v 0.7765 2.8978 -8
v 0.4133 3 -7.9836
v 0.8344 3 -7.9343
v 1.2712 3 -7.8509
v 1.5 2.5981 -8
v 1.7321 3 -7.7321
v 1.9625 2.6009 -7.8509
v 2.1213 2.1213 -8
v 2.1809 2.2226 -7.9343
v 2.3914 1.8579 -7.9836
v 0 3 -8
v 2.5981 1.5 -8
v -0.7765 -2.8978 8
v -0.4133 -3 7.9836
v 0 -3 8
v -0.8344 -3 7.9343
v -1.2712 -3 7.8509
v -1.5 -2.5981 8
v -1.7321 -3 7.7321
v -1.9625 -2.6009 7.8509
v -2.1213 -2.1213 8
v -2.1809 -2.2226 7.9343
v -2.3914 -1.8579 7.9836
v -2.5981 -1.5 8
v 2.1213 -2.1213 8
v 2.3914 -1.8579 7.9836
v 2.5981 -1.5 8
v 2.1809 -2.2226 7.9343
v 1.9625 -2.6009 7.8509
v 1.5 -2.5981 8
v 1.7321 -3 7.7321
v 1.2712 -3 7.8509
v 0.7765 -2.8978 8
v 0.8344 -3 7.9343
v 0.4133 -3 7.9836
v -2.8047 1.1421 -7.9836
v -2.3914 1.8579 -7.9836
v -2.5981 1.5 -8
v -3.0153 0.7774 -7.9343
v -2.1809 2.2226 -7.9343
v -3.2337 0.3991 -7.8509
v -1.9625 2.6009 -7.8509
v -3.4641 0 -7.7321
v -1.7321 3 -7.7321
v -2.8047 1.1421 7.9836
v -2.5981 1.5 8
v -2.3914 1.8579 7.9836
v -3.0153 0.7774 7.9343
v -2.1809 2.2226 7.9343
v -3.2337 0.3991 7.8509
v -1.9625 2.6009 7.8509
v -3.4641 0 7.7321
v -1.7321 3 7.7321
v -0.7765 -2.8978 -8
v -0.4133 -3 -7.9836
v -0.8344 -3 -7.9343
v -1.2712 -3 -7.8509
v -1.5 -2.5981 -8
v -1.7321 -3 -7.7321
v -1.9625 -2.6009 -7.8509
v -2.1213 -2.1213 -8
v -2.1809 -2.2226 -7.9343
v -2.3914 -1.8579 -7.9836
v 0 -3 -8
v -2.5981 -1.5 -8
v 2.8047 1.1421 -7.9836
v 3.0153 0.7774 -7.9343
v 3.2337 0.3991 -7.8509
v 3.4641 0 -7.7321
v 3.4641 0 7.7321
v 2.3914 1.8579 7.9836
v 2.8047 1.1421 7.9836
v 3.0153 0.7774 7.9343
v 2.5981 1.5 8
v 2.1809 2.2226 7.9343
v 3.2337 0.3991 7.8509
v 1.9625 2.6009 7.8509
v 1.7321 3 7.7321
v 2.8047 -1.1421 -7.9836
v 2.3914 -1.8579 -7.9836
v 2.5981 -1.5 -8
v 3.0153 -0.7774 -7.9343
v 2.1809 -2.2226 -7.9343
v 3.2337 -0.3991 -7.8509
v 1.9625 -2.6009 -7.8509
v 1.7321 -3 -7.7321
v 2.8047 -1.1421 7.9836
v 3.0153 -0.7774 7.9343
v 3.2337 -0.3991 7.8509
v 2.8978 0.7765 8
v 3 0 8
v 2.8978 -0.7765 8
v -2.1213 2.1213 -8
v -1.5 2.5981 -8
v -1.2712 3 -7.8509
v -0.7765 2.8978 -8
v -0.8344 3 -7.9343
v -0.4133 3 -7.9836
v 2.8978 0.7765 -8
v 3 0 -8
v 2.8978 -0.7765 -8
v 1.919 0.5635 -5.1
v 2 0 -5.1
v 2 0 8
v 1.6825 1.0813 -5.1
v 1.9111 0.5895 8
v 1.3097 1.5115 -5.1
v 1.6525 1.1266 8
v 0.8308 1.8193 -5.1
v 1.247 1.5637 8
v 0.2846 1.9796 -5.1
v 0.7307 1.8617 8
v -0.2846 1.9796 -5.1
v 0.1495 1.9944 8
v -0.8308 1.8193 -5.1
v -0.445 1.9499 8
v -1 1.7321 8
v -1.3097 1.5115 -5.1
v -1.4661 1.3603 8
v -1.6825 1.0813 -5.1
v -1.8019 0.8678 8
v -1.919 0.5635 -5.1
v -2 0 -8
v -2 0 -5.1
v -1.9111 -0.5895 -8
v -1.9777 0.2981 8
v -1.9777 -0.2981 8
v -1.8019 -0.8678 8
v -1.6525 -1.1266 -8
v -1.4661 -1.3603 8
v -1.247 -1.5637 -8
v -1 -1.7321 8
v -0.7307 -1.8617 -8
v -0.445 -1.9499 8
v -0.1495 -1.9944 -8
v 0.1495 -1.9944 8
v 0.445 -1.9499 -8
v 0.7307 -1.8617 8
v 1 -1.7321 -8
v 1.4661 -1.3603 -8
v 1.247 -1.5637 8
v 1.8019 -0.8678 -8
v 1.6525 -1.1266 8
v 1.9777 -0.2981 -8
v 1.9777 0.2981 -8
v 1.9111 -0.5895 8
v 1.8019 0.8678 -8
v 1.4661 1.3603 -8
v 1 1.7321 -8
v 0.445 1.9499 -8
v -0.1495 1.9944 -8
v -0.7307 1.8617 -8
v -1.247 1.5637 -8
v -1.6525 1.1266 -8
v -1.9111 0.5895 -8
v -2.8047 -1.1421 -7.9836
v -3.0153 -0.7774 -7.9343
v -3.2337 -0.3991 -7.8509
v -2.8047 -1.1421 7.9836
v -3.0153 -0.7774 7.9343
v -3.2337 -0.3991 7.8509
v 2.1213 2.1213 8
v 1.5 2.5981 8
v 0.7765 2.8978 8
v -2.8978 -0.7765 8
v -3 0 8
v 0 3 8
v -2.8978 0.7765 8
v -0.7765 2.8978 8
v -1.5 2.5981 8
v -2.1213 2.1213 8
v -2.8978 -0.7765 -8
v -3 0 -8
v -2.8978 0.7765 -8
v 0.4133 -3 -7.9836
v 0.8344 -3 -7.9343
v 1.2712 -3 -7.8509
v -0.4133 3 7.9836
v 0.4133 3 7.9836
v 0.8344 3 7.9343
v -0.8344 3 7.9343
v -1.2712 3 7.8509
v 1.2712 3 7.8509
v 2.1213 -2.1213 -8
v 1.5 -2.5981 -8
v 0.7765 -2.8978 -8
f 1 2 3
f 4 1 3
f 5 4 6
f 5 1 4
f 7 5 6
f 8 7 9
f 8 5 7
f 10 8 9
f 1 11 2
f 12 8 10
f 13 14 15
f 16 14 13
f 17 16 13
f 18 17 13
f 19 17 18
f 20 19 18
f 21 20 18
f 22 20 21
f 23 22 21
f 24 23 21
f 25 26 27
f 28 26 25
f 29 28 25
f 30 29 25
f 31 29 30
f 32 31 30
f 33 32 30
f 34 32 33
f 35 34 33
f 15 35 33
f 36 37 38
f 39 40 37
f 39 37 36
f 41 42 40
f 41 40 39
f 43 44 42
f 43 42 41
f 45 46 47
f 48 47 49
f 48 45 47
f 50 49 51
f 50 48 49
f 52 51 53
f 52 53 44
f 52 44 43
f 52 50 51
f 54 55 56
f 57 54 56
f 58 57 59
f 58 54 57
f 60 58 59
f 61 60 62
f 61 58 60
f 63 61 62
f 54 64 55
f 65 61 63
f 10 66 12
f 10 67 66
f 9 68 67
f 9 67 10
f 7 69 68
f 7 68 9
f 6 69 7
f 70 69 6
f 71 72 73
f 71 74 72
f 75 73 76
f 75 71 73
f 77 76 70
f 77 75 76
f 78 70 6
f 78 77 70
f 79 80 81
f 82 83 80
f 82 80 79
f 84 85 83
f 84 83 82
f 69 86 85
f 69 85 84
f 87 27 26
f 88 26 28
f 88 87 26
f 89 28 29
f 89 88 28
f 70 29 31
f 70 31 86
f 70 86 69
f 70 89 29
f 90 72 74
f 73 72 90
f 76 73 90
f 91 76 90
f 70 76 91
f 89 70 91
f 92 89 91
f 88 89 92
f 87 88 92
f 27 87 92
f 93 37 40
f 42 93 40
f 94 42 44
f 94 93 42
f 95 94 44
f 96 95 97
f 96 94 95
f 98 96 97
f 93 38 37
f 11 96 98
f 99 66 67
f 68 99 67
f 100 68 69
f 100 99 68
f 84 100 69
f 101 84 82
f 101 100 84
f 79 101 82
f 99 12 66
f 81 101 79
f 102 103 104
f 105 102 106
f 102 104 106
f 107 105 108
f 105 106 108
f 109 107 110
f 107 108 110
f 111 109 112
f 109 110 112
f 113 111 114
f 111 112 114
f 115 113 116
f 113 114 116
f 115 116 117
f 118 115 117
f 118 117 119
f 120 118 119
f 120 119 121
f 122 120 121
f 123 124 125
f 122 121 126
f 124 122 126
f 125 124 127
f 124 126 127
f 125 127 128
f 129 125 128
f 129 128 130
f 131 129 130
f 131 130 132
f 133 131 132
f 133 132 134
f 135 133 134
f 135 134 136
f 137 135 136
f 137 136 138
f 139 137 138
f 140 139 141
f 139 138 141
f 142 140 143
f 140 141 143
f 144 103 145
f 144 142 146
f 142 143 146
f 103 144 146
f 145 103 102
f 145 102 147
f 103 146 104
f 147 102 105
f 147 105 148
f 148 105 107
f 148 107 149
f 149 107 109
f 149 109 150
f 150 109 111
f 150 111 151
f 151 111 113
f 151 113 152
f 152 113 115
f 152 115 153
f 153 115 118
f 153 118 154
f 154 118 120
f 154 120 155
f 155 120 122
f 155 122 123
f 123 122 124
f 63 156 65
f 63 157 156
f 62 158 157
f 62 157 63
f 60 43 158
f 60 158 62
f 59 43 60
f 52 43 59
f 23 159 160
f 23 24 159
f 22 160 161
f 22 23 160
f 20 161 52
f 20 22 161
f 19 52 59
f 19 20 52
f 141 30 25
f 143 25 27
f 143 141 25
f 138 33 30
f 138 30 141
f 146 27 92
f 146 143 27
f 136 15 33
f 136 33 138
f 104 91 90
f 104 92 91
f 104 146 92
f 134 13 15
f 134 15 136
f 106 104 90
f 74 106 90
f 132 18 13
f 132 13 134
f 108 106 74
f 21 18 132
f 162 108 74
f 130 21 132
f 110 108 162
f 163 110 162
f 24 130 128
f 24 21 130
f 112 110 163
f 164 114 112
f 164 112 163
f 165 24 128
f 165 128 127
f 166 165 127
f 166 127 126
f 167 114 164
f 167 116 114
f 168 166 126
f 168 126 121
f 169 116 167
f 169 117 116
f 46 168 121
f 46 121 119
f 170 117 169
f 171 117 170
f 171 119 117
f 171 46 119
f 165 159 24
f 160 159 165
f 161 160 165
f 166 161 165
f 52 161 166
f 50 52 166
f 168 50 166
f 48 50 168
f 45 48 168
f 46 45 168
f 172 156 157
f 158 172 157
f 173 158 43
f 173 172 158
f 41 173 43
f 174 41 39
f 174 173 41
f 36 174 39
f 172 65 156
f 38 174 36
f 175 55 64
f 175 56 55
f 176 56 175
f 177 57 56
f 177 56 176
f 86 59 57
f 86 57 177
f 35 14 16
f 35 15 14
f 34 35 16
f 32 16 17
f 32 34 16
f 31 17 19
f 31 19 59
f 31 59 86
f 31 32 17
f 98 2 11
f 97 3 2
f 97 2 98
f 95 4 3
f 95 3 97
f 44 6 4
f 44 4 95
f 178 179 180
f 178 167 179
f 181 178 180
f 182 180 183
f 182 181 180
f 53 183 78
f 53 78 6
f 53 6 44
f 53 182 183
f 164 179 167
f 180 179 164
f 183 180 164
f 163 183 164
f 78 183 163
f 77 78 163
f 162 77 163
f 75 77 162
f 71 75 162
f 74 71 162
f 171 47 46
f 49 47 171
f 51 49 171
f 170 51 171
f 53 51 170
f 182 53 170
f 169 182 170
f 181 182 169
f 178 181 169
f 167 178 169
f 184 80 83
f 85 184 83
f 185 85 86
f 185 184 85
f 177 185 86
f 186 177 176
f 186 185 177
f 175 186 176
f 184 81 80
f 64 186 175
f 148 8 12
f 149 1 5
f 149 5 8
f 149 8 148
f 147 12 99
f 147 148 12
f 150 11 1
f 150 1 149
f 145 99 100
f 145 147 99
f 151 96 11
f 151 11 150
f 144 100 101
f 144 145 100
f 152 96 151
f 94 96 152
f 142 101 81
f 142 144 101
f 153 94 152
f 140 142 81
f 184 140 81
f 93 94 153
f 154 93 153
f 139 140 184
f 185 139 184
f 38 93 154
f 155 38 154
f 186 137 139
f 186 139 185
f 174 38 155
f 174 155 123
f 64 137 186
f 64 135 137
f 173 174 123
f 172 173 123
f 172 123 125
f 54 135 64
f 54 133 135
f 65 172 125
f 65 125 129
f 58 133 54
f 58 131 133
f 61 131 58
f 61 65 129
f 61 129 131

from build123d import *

# Parameters (mm, degrees)
SKETCH2_OUTSIDE_W               = 13.34
SKETCH2_OUTSIDE_H               = 13.34
CUT_EXTRUDE1_DEPTH              = 17.856007831
M4X0_7_TAPPED_HOLE1_D           = 3.3
M4X0_7_TAPPED_HOLE1_DEPTH       = 14.5
M4X0_7_TAPPED_HOLE1_CBORE_D     = 4
M4X0_7_TAPPED_HOLE1_CBORE_DEPTH = 13.1
M4X0_7_TAPPED_HOLE1_TIP         = 0.991420021
M4X0_7_TAPPED_HOLE2_D           = 3.3
M4X0_7_TAPPED_HOLE2_DEPTH       = 12.5
M4X0_7_TAPPED_HOLE2_CBORE_D     = 4
M4X0_7_TAPPED_HOLE2_CBORE_DEPTH = 11.1
M4X0_7_TAPPED_HOLE2_TIP         = 0.991420021


with BuildPart() as part:
    # Sketch1 → Revolve1 (revolve)
    with BuildSketch(Plane(origin=(0, 0, 0), x_dir=(0, 0, -1), z_dir=(1, 0, 0))):
        Polygon((-8, 0), (-8, 3), (-7.566987298, 3.75), (7.566987298, 3.75), (8, 3), (8, 0), align=None)
    revolve(axis=Axis((0, 0, 5.584882278), (0, 0, -1)))

    # Sketch2 outside → Cut-Extrude1 (cut, through all)
    with BuildSketch(Plane.XY.offset(8)):
        Rectangle(SKETCH2_OUTSIDE_W, SKETCH2_OUTSIDE_H)
        Polygon((1.732050808, -3), (3.464101615, 0), (1.732050808, 3), (-1.732050808, 3), (-3.464101615, 0), (-1.732050808, -3), align=None, mode=Mode.SUBTRACT)
    extrude(amount=-CUT_EXTRUDE1_DEPTH, mode=Mode.SUBTRACT)

    # M4x0.7 Tapped Hole1
    with Locations(Plane.XY.offset(8)):
        with Locations((0, 0)):
            CounterBoreHole(M4X0_7_TAPPED_HOLE1_D / 2, M4X0_7_TAPPED_HOLE1_CBORE_D / 2, M4X0_7_TAPPED_HOLE1_CBORE_DEPTH, depth=M4X0_7_TAPPED_HOLE1_DEPTH)
            with Locations((0, 0, -(M4X0_7_TAPPED_HOLE1_DEPTH + M4X0_7_TAPPED_HOLE1_TIP / 2))):  # 118° drill point
                Cone(0, M4X0_7_TAPPED_HOLE1_D / 2, M4X0_7_TAPPED_HOLE1_TIP, mode=Mode.SUBTRACT)

    # M4x0.7 Tapped Hole2
    with Locations(Plane(origin=(0, 0, -8), x_dir=(-1, 0, 0), z_dir=(0, 0, -1))):
        with Locations((0, 0)):
            CounterBoreHole(M4X0_7_TAPPED_HOLE2_D / 2, M4X0_7_TAPPED_HOLE2_CBORE_D / 2, M4X0_7_TAPPED_HOLE2_CBORE_DEPTH, depth=M4X0_7_TAPPED_HOLE2_DEPTH)
            with Locations((0, 0, -(M4X0_7_TAPPED_HOLE2_DEPTH + M4X0_7_TAPPED_HOLE2_TIP / 2))):  # 118° drill point
                Cone(0, M4X0_7_TAPPED_HOLE2_D / 2, M4X0_7_TAPPED_HOLE2_TIP, mode=Mode.SUBTRACT)


solid = part.part
